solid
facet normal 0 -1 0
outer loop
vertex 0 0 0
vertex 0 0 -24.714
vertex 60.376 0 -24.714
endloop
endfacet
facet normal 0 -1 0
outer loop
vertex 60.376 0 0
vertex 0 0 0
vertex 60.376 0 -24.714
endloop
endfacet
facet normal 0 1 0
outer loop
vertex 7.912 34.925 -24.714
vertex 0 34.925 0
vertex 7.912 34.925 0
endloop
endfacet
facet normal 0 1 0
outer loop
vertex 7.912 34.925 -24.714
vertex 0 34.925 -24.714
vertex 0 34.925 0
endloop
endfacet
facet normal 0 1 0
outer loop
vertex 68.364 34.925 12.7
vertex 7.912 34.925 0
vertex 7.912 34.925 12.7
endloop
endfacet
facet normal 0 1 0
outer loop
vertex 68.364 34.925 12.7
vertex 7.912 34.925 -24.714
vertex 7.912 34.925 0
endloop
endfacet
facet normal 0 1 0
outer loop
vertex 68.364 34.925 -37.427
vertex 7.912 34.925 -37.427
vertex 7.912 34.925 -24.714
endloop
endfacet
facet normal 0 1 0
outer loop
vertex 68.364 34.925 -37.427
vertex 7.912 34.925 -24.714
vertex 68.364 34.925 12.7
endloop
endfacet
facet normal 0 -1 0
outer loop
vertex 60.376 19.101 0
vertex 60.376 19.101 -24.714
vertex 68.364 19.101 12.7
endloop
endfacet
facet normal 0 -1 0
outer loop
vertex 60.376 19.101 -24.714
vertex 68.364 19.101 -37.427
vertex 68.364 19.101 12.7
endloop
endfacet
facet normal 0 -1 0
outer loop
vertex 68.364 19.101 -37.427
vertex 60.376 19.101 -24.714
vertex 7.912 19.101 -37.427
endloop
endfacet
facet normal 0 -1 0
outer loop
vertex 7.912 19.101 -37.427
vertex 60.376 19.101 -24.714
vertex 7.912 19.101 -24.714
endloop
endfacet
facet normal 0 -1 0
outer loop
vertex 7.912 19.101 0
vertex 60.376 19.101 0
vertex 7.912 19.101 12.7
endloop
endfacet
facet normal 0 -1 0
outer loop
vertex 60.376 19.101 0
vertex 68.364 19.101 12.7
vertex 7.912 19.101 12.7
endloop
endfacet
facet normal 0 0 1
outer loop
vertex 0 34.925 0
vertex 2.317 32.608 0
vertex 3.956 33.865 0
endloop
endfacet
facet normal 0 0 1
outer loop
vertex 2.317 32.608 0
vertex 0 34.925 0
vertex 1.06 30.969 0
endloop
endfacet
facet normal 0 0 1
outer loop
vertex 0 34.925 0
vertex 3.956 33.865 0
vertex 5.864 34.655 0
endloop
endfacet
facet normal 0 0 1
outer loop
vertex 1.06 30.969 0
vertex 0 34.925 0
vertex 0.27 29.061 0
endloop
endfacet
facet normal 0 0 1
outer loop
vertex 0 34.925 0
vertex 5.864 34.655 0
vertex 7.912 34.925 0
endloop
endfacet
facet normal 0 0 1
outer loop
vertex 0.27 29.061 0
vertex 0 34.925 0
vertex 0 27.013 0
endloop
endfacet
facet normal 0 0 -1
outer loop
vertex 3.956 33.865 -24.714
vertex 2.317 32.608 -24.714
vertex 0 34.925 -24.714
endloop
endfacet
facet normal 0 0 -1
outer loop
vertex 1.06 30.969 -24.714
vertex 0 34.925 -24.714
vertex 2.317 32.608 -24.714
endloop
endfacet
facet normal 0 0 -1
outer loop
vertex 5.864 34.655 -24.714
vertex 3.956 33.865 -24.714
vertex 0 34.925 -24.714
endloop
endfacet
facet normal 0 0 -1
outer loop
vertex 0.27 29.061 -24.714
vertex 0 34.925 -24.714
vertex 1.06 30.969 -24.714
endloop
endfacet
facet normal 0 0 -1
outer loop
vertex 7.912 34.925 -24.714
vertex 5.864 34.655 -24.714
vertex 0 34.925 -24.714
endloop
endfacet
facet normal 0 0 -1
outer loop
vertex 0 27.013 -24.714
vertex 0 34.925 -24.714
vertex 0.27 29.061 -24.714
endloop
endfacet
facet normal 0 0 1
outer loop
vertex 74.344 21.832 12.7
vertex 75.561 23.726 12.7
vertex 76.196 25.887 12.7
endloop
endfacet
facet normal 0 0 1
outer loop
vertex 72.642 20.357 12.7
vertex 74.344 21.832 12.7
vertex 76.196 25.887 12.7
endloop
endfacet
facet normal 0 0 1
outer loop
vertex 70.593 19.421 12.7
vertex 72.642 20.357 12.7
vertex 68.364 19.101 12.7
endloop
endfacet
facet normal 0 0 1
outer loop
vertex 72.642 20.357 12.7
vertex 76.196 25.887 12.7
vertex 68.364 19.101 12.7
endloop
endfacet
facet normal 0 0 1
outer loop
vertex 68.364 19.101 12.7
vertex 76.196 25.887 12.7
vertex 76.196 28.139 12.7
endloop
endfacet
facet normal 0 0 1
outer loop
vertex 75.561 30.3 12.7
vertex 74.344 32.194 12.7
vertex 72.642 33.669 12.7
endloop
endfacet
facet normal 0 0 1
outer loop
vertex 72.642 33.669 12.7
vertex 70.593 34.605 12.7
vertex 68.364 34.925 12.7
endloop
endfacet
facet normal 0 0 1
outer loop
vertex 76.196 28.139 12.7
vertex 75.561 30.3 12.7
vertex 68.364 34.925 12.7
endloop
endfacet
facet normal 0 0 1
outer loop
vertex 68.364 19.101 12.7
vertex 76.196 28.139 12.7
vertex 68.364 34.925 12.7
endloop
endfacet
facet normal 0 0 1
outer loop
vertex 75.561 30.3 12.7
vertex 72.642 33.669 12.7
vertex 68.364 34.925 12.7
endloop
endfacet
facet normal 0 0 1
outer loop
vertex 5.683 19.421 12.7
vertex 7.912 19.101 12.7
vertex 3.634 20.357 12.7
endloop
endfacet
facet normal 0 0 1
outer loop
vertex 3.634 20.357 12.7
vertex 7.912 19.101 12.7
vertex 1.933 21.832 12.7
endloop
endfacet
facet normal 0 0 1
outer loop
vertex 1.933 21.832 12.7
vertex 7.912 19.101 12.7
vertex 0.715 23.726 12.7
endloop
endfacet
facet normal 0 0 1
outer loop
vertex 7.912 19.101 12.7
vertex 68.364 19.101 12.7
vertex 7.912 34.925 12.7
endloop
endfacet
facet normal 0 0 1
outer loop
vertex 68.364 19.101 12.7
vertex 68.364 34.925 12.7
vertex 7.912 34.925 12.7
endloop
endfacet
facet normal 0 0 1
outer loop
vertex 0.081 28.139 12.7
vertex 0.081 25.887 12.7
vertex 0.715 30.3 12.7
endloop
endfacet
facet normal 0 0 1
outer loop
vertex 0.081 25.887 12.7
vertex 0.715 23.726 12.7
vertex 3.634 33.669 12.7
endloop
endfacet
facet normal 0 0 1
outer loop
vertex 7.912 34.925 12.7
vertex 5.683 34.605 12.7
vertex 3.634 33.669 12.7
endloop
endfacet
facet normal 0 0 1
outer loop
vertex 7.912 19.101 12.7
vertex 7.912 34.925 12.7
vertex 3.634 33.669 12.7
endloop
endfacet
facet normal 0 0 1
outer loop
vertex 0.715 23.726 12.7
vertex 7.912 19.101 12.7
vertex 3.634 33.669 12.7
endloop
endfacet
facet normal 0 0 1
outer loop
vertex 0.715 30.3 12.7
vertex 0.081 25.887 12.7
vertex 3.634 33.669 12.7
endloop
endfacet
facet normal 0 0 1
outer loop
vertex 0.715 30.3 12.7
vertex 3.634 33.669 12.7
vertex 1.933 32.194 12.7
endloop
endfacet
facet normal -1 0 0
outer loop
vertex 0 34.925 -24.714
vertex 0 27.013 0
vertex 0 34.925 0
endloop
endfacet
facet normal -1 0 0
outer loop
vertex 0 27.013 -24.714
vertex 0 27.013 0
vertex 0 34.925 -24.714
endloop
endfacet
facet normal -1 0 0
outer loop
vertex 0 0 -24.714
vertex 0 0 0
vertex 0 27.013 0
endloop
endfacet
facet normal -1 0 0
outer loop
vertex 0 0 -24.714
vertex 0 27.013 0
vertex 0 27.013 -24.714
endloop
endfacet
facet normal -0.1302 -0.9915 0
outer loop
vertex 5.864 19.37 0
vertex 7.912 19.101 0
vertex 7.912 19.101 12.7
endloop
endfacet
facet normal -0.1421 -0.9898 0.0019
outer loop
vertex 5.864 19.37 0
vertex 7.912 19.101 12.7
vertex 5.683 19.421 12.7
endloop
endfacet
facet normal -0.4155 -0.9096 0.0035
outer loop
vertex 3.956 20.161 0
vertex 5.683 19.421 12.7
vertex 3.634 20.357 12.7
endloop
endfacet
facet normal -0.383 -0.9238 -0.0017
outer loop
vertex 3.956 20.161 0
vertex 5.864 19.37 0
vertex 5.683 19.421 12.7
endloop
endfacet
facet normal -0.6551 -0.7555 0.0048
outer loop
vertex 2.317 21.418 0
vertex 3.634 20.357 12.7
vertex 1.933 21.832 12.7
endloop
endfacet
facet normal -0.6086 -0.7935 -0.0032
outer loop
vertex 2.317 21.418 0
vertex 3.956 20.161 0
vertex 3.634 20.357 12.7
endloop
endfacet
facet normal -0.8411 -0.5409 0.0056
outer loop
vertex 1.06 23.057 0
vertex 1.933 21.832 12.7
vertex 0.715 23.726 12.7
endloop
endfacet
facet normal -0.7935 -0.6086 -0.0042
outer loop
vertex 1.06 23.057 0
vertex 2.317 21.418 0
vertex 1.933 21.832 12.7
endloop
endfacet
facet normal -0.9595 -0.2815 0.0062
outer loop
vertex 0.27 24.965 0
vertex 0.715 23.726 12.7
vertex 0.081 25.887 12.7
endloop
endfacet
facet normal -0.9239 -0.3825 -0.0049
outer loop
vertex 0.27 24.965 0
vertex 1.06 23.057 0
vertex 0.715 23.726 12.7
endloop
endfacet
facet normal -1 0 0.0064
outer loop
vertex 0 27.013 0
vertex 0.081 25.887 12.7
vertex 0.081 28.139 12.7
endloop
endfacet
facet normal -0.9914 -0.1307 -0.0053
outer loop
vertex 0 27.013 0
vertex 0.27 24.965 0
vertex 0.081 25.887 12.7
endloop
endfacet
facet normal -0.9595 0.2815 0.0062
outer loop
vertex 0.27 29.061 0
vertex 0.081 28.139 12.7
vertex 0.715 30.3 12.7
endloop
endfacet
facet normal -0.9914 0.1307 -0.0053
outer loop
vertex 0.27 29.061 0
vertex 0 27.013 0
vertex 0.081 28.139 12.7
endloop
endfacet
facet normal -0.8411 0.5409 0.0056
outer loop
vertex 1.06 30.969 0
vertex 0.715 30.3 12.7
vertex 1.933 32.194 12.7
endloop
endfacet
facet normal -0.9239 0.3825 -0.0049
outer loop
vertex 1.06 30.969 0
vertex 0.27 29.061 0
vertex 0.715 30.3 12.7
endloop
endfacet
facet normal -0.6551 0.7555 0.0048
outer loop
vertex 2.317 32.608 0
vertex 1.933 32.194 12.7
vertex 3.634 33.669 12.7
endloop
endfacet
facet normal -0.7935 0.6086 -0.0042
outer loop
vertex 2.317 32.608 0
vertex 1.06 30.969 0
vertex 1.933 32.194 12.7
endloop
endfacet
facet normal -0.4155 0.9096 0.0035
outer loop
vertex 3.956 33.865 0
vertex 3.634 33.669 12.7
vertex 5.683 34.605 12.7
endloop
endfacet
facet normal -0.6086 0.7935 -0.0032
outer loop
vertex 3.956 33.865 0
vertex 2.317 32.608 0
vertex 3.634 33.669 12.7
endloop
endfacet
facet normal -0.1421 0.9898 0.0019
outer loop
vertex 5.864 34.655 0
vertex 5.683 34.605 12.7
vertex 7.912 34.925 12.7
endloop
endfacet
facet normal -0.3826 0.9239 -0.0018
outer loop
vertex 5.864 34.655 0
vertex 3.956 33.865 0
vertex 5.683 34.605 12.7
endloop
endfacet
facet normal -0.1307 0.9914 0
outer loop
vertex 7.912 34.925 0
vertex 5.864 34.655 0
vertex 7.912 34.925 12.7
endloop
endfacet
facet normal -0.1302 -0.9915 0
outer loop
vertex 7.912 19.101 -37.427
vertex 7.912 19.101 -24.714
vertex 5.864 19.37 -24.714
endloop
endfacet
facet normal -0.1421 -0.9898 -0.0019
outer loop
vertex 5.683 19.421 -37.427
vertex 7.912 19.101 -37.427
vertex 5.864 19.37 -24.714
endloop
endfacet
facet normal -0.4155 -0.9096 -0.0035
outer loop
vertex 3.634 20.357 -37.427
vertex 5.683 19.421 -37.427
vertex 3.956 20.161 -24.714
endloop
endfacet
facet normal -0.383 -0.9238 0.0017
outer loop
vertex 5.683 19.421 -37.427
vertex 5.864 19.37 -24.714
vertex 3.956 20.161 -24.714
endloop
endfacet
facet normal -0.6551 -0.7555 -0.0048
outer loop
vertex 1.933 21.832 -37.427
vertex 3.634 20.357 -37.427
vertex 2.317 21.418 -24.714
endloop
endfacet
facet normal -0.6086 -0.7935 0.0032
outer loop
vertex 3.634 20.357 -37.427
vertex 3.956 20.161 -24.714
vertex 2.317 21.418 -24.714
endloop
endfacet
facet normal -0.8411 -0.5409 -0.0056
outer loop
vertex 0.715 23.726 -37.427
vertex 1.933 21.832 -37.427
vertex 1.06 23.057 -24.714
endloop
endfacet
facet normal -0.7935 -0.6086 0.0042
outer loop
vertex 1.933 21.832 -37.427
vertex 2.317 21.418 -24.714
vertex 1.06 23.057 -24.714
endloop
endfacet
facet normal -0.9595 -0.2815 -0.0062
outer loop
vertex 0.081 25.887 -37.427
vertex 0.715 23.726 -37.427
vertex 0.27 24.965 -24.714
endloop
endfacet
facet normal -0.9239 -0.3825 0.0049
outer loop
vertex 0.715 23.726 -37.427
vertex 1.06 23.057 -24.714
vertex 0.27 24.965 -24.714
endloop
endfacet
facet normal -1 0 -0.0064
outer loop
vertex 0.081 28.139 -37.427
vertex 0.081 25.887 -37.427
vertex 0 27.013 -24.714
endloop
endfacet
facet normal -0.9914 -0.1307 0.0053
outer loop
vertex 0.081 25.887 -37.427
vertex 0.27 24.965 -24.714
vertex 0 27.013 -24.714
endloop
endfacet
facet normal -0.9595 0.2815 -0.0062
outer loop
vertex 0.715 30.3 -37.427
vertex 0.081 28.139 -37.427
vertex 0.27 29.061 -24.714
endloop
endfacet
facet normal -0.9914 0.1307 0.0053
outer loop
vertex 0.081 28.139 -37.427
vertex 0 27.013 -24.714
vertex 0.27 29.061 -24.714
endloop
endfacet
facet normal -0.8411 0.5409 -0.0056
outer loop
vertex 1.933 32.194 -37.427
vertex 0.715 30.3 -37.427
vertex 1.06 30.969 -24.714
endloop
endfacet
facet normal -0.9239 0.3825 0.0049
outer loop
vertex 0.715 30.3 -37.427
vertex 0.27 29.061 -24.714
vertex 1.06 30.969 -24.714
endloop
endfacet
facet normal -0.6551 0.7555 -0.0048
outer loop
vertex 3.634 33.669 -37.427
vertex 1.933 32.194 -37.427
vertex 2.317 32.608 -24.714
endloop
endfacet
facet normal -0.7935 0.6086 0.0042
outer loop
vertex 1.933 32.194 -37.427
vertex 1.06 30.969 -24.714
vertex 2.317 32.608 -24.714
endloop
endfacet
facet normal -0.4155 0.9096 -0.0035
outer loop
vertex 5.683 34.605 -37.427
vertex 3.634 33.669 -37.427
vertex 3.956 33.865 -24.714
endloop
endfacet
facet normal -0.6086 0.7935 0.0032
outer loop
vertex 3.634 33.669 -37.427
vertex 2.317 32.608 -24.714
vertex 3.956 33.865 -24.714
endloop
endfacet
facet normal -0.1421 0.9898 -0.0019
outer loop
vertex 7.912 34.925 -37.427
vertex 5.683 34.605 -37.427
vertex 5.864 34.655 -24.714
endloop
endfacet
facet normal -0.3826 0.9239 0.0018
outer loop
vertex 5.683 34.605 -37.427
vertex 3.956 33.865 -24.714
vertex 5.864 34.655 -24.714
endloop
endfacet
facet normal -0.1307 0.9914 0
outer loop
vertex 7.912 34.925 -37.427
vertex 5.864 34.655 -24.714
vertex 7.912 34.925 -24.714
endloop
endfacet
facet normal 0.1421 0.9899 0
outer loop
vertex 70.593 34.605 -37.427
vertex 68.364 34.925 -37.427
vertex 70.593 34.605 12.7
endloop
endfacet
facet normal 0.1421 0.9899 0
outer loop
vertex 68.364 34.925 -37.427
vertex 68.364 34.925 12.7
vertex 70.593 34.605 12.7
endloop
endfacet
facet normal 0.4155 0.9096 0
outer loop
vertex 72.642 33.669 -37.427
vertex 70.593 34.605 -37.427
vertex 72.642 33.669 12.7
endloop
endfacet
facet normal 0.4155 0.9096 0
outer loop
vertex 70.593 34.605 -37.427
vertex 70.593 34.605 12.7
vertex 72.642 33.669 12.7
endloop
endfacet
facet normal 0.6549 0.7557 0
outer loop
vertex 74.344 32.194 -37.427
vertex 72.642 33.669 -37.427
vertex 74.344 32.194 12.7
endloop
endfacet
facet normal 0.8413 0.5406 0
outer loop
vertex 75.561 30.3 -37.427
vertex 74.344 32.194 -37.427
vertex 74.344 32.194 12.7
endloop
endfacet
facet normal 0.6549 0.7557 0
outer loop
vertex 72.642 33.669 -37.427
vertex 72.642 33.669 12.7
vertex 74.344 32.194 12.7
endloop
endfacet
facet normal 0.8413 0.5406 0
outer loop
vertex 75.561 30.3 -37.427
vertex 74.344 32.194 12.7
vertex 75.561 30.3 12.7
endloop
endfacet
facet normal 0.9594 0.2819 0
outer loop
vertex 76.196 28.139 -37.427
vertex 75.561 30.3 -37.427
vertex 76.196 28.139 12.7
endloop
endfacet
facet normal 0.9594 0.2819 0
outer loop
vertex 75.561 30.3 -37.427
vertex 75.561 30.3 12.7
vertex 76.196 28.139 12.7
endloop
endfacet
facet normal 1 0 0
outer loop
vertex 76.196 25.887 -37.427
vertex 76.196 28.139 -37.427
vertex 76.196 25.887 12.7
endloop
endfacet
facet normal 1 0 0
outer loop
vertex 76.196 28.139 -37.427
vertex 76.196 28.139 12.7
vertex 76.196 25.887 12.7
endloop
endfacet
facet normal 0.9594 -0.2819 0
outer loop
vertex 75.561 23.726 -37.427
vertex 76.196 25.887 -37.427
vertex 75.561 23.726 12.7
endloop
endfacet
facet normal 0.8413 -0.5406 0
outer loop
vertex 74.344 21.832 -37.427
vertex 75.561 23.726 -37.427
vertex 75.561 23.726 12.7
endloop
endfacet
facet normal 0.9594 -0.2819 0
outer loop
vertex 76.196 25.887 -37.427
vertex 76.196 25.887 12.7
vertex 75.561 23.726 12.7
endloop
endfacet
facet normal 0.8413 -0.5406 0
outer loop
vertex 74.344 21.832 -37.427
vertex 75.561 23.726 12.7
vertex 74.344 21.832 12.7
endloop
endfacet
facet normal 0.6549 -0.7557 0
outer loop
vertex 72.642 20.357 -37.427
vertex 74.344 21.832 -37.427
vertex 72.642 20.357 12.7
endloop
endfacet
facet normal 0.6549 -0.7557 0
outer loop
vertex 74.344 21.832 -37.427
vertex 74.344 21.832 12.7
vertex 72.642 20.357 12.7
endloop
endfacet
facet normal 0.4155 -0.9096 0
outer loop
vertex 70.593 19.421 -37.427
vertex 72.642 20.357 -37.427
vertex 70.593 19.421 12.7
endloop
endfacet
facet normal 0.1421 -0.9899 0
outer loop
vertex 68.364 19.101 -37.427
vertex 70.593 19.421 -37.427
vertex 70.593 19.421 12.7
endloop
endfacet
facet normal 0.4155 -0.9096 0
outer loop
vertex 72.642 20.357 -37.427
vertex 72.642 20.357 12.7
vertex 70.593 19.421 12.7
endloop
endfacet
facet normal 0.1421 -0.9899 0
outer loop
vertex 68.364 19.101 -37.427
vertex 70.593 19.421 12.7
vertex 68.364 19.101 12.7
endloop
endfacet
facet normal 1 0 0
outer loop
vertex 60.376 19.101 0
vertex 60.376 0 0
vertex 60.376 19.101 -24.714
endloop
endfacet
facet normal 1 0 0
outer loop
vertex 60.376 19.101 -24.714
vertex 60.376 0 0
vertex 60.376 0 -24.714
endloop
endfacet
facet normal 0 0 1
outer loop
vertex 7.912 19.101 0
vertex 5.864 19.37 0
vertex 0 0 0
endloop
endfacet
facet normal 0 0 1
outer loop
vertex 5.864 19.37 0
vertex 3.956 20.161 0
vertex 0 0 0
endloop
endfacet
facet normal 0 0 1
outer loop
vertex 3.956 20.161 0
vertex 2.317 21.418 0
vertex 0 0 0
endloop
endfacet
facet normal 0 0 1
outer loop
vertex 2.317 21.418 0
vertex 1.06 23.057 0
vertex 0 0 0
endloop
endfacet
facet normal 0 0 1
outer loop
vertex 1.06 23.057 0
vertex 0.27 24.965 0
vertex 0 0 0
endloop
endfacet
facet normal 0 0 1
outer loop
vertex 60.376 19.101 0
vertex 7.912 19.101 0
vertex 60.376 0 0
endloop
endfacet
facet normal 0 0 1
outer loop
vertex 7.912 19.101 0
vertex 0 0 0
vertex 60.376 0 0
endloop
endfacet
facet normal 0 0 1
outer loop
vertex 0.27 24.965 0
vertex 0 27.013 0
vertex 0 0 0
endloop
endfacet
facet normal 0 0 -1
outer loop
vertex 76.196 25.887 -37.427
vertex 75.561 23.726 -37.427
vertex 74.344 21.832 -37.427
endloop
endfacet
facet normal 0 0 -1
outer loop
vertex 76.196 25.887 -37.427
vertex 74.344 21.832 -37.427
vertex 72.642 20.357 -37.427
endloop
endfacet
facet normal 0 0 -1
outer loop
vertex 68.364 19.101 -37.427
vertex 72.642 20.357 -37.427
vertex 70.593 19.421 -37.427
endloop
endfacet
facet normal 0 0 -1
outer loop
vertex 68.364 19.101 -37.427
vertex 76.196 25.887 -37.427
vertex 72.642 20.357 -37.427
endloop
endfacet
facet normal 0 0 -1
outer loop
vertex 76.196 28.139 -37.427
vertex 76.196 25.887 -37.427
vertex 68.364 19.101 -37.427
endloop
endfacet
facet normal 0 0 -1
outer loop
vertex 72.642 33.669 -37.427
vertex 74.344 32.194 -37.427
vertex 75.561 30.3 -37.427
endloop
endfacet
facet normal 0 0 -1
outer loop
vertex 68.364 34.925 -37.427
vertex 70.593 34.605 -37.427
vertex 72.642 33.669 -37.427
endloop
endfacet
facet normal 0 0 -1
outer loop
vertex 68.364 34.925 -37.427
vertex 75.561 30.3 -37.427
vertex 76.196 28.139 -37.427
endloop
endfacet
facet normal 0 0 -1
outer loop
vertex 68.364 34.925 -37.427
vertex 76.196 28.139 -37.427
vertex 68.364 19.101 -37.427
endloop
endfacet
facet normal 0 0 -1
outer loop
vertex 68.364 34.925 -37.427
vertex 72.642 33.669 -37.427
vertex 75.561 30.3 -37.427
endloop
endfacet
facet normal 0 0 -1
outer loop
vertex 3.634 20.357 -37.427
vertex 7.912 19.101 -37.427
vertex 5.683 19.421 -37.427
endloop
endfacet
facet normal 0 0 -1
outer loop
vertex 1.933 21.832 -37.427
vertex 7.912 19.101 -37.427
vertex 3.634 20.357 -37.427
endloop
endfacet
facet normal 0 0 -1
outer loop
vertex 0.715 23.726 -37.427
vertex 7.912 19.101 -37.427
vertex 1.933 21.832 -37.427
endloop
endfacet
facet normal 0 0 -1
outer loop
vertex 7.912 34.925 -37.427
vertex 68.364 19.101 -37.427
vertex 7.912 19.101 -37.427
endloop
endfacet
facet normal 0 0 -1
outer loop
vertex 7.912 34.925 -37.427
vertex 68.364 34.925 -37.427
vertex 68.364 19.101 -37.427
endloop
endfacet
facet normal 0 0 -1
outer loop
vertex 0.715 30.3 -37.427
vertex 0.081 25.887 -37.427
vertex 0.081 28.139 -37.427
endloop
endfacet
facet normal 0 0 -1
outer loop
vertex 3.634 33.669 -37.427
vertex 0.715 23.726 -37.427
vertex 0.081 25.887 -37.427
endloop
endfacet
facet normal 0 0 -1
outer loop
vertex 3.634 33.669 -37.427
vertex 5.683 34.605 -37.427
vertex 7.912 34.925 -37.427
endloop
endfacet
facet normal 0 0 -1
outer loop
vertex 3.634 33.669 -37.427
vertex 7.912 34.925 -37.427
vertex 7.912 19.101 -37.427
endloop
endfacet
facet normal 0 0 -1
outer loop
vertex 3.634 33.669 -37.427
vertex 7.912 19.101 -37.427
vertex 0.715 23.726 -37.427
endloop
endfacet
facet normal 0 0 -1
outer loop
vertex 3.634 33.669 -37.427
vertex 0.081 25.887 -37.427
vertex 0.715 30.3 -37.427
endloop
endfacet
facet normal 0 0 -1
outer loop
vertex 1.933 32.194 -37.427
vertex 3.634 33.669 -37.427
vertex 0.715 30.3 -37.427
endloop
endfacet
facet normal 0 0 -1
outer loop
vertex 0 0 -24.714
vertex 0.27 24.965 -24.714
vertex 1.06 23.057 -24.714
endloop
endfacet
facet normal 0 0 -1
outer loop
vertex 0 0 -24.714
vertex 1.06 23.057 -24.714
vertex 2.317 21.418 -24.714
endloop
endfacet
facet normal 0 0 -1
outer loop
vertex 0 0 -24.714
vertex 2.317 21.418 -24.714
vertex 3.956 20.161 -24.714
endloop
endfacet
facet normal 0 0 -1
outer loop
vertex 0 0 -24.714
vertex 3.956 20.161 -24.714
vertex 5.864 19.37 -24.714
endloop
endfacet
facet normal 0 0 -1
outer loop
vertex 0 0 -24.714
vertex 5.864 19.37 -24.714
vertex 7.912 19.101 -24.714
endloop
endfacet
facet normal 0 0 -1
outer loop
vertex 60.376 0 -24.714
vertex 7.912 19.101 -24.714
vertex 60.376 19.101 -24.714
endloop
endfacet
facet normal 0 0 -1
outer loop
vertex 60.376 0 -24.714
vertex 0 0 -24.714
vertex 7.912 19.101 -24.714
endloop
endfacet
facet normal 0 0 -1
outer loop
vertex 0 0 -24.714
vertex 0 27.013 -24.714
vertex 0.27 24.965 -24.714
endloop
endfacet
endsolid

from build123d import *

# Parameters (mm, degrees)
SKETCH1_W                = 60.3758
SKETCH1_H                = 24.7142
BOSS_EXTRUDE1_DEPTH      = 34.925
BOSS_EXTRUDE2_DEPTH      = 12.7
BOSS_EXTRUDE2_DEPTH_BACK = 37.4269


with BuildPart() as part:
    # Sketch1 → Boss-Extrude1 (new body)
    with BuildSketch(Plane(origin=(0, 0, 0), x_dir=(1, 0, 0), z_dir=(0, 1, 0))):
        with Locations((30.1879, 12.3571)):
            Rectangle(SKETCH1_W, SKETCH1_H)
    extrude(amount=BOSS_EXTRUDE1_DEPTH)

    # Sketch2 → Boss-Extrude2 (add, two sides)
    with BuildSketch(Plane.XY) as boss_extrude2_sk:
        with BuildLine():
            Line((7.9121, 34.925), (68.3641, 34.925))
            ThreePointArc((68.3641, 34.925), (76.2762, 27.0129), (68.3641, 19.1008))
            Line((68.3641, 19.1008), (7.9121, 19.1008))
            ThreePointArc((7.9121, 19.1008), (0, 27.0129), (7.9121, 34.925))
        make_face()
    extrude(amount=BOSS_EXTRUDE2_DEPTH)
    extrude(boss_extrude2_sk.sketch, amount=-BOSS_EXTRUDE2_DEPTH_BACK)


solid = part.part
